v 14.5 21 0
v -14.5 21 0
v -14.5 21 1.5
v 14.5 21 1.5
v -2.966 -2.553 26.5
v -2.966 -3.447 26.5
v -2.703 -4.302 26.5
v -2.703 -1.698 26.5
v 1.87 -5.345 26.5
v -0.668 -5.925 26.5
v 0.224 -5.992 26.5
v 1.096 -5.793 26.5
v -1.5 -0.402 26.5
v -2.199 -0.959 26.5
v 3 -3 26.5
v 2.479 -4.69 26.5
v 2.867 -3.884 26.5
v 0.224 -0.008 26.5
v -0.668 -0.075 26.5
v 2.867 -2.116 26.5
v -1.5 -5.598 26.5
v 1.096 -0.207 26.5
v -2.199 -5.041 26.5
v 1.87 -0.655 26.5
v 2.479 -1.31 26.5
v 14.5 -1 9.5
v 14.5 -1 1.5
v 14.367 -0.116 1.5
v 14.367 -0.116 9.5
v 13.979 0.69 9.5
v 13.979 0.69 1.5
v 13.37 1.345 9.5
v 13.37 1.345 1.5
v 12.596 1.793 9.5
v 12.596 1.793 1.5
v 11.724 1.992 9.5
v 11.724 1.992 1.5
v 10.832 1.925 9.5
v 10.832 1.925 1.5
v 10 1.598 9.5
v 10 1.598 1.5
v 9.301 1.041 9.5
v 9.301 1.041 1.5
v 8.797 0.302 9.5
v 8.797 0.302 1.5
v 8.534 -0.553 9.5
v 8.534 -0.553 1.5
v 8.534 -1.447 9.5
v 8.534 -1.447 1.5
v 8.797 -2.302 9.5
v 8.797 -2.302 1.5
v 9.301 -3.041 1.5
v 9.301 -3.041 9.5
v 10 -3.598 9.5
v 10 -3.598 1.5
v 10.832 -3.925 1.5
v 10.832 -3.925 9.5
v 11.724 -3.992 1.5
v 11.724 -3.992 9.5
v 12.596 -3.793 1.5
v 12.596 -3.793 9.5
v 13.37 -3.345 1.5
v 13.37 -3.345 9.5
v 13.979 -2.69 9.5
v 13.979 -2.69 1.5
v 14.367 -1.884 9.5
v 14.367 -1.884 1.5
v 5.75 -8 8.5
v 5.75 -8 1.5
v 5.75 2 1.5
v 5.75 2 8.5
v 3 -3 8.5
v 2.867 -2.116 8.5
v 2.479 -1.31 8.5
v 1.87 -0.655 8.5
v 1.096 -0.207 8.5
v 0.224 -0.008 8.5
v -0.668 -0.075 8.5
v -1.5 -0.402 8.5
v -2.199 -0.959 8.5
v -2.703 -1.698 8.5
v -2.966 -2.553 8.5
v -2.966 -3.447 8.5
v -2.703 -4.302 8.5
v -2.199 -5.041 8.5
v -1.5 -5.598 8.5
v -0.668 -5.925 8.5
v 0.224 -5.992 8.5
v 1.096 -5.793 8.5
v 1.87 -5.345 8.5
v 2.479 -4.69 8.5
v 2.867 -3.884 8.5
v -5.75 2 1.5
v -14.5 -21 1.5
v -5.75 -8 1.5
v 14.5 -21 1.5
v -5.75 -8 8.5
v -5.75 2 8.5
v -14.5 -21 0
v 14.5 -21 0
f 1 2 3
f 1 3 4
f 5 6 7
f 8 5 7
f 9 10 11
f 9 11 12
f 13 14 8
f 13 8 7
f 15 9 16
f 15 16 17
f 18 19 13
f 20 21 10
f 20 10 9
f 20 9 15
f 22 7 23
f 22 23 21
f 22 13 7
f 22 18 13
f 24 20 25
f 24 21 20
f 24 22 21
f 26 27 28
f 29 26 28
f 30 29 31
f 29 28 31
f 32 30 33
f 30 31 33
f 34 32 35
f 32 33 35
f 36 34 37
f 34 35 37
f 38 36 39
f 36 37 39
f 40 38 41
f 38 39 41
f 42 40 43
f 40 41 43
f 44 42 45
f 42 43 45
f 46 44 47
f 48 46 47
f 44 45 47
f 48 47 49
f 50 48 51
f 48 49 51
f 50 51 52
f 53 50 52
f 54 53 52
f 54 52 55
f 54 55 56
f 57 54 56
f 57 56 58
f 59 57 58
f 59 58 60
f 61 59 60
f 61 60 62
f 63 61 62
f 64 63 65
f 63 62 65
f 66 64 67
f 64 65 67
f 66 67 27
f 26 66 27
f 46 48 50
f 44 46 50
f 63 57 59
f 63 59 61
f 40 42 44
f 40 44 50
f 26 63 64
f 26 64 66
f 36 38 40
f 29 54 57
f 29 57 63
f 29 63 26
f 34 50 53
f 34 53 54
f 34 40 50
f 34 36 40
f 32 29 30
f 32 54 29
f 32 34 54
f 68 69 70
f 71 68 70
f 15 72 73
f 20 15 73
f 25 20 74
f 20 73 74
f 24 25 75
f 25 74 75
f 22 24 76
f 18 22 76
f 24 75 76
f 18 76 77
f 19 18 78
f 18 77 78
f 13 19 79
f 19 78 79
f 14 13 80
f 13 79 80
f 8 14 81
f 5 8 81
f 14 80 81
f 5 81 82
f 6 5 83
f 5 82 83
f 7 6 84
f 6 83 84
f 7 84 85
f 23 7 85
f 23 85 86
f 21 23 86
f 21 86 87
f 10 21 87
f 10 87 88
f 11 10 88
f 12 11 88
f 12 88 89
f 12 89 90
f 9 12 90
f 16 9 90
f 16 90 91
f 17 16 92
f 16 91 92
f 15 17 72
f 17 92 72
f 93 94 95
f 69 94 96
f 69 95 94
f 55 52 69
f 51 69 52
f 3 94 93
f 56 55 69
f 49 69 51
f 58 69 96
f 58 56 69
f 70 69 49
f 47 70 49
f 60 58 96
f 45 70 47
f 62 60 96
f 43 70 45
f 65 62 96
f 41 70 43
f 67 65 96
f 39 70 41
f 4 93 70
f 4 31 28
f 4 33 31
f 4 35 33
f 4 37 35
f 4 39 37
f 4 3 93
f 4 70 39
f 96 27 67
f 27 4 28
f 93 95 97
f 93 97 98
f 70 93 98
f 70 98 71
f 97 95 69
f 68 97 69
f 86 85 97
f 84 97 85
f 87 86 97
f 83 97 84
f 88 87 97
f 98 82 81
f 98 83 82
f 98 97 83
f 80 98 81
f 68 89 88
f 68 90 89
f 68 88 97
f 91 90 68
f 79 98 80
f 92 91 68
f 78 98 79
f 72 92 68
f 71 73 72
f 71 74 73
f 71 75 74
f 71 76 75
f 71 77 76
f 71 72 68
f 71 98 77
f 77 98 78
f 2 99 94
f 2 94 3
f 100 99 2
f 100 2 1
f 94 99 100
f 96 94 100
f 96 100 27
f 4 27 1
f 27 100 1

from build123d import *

# Parameters (mm, degrees)
SKETCH1_W           = 29
SKETCH1_H           = 42
BOSS_EXTRUDE1_DEPTH = 1.5
SKETCH2_W           = 11.5
SKETCH2_H           = 10
BOSS_EXTRUDE2_DEPTH = 7
SKETCH3_R           = 3
BOSS_EXTRUDE3_DEPTH = 18
SKETCH4_R           = 3
BOSS_EXTRUDE4_DEPTH = 8


with BuildPart() as part:
    # Sketch1 → Boss-Extrude1 (new body)
    with BuildSketch(Plane.XY):
        Rectangle(SKETCH1_W, SKETCH1_H)
    extrude(amount=BOSS_EXTRUDE1_DEPTH)

    # Sketch2 → Boss-Extrude2 (add)
    with BuildSketch(Plane.XY.offset(1.5)):
        with Locations((0, -3)):
            Rectangle(SKETCH2_W, SKETCH2_H)
    extrude(amount=BOSS_EXTRUDE2_DEPTH)

    # Sketch3 → Boss-Extrude3 (add)
    with BuildSketch(Plane.XY.offset(8.5)):
        with Locations((0, -3)):
            Circle(SKETCH3_R)
    extrude(amount=BOSS_EXTRUDE3_DEPTH)

    # Sketch4 → Boss-Extrude4 (add)
    with BuildSketch(Plane.XY.offset(1.5)):
        with Locations((11.5, -1)):
            Circle(SKETCH4_R)
    extrude(amount=BOSS_EXTRUDE4_DEPTH)


solid = part.part
